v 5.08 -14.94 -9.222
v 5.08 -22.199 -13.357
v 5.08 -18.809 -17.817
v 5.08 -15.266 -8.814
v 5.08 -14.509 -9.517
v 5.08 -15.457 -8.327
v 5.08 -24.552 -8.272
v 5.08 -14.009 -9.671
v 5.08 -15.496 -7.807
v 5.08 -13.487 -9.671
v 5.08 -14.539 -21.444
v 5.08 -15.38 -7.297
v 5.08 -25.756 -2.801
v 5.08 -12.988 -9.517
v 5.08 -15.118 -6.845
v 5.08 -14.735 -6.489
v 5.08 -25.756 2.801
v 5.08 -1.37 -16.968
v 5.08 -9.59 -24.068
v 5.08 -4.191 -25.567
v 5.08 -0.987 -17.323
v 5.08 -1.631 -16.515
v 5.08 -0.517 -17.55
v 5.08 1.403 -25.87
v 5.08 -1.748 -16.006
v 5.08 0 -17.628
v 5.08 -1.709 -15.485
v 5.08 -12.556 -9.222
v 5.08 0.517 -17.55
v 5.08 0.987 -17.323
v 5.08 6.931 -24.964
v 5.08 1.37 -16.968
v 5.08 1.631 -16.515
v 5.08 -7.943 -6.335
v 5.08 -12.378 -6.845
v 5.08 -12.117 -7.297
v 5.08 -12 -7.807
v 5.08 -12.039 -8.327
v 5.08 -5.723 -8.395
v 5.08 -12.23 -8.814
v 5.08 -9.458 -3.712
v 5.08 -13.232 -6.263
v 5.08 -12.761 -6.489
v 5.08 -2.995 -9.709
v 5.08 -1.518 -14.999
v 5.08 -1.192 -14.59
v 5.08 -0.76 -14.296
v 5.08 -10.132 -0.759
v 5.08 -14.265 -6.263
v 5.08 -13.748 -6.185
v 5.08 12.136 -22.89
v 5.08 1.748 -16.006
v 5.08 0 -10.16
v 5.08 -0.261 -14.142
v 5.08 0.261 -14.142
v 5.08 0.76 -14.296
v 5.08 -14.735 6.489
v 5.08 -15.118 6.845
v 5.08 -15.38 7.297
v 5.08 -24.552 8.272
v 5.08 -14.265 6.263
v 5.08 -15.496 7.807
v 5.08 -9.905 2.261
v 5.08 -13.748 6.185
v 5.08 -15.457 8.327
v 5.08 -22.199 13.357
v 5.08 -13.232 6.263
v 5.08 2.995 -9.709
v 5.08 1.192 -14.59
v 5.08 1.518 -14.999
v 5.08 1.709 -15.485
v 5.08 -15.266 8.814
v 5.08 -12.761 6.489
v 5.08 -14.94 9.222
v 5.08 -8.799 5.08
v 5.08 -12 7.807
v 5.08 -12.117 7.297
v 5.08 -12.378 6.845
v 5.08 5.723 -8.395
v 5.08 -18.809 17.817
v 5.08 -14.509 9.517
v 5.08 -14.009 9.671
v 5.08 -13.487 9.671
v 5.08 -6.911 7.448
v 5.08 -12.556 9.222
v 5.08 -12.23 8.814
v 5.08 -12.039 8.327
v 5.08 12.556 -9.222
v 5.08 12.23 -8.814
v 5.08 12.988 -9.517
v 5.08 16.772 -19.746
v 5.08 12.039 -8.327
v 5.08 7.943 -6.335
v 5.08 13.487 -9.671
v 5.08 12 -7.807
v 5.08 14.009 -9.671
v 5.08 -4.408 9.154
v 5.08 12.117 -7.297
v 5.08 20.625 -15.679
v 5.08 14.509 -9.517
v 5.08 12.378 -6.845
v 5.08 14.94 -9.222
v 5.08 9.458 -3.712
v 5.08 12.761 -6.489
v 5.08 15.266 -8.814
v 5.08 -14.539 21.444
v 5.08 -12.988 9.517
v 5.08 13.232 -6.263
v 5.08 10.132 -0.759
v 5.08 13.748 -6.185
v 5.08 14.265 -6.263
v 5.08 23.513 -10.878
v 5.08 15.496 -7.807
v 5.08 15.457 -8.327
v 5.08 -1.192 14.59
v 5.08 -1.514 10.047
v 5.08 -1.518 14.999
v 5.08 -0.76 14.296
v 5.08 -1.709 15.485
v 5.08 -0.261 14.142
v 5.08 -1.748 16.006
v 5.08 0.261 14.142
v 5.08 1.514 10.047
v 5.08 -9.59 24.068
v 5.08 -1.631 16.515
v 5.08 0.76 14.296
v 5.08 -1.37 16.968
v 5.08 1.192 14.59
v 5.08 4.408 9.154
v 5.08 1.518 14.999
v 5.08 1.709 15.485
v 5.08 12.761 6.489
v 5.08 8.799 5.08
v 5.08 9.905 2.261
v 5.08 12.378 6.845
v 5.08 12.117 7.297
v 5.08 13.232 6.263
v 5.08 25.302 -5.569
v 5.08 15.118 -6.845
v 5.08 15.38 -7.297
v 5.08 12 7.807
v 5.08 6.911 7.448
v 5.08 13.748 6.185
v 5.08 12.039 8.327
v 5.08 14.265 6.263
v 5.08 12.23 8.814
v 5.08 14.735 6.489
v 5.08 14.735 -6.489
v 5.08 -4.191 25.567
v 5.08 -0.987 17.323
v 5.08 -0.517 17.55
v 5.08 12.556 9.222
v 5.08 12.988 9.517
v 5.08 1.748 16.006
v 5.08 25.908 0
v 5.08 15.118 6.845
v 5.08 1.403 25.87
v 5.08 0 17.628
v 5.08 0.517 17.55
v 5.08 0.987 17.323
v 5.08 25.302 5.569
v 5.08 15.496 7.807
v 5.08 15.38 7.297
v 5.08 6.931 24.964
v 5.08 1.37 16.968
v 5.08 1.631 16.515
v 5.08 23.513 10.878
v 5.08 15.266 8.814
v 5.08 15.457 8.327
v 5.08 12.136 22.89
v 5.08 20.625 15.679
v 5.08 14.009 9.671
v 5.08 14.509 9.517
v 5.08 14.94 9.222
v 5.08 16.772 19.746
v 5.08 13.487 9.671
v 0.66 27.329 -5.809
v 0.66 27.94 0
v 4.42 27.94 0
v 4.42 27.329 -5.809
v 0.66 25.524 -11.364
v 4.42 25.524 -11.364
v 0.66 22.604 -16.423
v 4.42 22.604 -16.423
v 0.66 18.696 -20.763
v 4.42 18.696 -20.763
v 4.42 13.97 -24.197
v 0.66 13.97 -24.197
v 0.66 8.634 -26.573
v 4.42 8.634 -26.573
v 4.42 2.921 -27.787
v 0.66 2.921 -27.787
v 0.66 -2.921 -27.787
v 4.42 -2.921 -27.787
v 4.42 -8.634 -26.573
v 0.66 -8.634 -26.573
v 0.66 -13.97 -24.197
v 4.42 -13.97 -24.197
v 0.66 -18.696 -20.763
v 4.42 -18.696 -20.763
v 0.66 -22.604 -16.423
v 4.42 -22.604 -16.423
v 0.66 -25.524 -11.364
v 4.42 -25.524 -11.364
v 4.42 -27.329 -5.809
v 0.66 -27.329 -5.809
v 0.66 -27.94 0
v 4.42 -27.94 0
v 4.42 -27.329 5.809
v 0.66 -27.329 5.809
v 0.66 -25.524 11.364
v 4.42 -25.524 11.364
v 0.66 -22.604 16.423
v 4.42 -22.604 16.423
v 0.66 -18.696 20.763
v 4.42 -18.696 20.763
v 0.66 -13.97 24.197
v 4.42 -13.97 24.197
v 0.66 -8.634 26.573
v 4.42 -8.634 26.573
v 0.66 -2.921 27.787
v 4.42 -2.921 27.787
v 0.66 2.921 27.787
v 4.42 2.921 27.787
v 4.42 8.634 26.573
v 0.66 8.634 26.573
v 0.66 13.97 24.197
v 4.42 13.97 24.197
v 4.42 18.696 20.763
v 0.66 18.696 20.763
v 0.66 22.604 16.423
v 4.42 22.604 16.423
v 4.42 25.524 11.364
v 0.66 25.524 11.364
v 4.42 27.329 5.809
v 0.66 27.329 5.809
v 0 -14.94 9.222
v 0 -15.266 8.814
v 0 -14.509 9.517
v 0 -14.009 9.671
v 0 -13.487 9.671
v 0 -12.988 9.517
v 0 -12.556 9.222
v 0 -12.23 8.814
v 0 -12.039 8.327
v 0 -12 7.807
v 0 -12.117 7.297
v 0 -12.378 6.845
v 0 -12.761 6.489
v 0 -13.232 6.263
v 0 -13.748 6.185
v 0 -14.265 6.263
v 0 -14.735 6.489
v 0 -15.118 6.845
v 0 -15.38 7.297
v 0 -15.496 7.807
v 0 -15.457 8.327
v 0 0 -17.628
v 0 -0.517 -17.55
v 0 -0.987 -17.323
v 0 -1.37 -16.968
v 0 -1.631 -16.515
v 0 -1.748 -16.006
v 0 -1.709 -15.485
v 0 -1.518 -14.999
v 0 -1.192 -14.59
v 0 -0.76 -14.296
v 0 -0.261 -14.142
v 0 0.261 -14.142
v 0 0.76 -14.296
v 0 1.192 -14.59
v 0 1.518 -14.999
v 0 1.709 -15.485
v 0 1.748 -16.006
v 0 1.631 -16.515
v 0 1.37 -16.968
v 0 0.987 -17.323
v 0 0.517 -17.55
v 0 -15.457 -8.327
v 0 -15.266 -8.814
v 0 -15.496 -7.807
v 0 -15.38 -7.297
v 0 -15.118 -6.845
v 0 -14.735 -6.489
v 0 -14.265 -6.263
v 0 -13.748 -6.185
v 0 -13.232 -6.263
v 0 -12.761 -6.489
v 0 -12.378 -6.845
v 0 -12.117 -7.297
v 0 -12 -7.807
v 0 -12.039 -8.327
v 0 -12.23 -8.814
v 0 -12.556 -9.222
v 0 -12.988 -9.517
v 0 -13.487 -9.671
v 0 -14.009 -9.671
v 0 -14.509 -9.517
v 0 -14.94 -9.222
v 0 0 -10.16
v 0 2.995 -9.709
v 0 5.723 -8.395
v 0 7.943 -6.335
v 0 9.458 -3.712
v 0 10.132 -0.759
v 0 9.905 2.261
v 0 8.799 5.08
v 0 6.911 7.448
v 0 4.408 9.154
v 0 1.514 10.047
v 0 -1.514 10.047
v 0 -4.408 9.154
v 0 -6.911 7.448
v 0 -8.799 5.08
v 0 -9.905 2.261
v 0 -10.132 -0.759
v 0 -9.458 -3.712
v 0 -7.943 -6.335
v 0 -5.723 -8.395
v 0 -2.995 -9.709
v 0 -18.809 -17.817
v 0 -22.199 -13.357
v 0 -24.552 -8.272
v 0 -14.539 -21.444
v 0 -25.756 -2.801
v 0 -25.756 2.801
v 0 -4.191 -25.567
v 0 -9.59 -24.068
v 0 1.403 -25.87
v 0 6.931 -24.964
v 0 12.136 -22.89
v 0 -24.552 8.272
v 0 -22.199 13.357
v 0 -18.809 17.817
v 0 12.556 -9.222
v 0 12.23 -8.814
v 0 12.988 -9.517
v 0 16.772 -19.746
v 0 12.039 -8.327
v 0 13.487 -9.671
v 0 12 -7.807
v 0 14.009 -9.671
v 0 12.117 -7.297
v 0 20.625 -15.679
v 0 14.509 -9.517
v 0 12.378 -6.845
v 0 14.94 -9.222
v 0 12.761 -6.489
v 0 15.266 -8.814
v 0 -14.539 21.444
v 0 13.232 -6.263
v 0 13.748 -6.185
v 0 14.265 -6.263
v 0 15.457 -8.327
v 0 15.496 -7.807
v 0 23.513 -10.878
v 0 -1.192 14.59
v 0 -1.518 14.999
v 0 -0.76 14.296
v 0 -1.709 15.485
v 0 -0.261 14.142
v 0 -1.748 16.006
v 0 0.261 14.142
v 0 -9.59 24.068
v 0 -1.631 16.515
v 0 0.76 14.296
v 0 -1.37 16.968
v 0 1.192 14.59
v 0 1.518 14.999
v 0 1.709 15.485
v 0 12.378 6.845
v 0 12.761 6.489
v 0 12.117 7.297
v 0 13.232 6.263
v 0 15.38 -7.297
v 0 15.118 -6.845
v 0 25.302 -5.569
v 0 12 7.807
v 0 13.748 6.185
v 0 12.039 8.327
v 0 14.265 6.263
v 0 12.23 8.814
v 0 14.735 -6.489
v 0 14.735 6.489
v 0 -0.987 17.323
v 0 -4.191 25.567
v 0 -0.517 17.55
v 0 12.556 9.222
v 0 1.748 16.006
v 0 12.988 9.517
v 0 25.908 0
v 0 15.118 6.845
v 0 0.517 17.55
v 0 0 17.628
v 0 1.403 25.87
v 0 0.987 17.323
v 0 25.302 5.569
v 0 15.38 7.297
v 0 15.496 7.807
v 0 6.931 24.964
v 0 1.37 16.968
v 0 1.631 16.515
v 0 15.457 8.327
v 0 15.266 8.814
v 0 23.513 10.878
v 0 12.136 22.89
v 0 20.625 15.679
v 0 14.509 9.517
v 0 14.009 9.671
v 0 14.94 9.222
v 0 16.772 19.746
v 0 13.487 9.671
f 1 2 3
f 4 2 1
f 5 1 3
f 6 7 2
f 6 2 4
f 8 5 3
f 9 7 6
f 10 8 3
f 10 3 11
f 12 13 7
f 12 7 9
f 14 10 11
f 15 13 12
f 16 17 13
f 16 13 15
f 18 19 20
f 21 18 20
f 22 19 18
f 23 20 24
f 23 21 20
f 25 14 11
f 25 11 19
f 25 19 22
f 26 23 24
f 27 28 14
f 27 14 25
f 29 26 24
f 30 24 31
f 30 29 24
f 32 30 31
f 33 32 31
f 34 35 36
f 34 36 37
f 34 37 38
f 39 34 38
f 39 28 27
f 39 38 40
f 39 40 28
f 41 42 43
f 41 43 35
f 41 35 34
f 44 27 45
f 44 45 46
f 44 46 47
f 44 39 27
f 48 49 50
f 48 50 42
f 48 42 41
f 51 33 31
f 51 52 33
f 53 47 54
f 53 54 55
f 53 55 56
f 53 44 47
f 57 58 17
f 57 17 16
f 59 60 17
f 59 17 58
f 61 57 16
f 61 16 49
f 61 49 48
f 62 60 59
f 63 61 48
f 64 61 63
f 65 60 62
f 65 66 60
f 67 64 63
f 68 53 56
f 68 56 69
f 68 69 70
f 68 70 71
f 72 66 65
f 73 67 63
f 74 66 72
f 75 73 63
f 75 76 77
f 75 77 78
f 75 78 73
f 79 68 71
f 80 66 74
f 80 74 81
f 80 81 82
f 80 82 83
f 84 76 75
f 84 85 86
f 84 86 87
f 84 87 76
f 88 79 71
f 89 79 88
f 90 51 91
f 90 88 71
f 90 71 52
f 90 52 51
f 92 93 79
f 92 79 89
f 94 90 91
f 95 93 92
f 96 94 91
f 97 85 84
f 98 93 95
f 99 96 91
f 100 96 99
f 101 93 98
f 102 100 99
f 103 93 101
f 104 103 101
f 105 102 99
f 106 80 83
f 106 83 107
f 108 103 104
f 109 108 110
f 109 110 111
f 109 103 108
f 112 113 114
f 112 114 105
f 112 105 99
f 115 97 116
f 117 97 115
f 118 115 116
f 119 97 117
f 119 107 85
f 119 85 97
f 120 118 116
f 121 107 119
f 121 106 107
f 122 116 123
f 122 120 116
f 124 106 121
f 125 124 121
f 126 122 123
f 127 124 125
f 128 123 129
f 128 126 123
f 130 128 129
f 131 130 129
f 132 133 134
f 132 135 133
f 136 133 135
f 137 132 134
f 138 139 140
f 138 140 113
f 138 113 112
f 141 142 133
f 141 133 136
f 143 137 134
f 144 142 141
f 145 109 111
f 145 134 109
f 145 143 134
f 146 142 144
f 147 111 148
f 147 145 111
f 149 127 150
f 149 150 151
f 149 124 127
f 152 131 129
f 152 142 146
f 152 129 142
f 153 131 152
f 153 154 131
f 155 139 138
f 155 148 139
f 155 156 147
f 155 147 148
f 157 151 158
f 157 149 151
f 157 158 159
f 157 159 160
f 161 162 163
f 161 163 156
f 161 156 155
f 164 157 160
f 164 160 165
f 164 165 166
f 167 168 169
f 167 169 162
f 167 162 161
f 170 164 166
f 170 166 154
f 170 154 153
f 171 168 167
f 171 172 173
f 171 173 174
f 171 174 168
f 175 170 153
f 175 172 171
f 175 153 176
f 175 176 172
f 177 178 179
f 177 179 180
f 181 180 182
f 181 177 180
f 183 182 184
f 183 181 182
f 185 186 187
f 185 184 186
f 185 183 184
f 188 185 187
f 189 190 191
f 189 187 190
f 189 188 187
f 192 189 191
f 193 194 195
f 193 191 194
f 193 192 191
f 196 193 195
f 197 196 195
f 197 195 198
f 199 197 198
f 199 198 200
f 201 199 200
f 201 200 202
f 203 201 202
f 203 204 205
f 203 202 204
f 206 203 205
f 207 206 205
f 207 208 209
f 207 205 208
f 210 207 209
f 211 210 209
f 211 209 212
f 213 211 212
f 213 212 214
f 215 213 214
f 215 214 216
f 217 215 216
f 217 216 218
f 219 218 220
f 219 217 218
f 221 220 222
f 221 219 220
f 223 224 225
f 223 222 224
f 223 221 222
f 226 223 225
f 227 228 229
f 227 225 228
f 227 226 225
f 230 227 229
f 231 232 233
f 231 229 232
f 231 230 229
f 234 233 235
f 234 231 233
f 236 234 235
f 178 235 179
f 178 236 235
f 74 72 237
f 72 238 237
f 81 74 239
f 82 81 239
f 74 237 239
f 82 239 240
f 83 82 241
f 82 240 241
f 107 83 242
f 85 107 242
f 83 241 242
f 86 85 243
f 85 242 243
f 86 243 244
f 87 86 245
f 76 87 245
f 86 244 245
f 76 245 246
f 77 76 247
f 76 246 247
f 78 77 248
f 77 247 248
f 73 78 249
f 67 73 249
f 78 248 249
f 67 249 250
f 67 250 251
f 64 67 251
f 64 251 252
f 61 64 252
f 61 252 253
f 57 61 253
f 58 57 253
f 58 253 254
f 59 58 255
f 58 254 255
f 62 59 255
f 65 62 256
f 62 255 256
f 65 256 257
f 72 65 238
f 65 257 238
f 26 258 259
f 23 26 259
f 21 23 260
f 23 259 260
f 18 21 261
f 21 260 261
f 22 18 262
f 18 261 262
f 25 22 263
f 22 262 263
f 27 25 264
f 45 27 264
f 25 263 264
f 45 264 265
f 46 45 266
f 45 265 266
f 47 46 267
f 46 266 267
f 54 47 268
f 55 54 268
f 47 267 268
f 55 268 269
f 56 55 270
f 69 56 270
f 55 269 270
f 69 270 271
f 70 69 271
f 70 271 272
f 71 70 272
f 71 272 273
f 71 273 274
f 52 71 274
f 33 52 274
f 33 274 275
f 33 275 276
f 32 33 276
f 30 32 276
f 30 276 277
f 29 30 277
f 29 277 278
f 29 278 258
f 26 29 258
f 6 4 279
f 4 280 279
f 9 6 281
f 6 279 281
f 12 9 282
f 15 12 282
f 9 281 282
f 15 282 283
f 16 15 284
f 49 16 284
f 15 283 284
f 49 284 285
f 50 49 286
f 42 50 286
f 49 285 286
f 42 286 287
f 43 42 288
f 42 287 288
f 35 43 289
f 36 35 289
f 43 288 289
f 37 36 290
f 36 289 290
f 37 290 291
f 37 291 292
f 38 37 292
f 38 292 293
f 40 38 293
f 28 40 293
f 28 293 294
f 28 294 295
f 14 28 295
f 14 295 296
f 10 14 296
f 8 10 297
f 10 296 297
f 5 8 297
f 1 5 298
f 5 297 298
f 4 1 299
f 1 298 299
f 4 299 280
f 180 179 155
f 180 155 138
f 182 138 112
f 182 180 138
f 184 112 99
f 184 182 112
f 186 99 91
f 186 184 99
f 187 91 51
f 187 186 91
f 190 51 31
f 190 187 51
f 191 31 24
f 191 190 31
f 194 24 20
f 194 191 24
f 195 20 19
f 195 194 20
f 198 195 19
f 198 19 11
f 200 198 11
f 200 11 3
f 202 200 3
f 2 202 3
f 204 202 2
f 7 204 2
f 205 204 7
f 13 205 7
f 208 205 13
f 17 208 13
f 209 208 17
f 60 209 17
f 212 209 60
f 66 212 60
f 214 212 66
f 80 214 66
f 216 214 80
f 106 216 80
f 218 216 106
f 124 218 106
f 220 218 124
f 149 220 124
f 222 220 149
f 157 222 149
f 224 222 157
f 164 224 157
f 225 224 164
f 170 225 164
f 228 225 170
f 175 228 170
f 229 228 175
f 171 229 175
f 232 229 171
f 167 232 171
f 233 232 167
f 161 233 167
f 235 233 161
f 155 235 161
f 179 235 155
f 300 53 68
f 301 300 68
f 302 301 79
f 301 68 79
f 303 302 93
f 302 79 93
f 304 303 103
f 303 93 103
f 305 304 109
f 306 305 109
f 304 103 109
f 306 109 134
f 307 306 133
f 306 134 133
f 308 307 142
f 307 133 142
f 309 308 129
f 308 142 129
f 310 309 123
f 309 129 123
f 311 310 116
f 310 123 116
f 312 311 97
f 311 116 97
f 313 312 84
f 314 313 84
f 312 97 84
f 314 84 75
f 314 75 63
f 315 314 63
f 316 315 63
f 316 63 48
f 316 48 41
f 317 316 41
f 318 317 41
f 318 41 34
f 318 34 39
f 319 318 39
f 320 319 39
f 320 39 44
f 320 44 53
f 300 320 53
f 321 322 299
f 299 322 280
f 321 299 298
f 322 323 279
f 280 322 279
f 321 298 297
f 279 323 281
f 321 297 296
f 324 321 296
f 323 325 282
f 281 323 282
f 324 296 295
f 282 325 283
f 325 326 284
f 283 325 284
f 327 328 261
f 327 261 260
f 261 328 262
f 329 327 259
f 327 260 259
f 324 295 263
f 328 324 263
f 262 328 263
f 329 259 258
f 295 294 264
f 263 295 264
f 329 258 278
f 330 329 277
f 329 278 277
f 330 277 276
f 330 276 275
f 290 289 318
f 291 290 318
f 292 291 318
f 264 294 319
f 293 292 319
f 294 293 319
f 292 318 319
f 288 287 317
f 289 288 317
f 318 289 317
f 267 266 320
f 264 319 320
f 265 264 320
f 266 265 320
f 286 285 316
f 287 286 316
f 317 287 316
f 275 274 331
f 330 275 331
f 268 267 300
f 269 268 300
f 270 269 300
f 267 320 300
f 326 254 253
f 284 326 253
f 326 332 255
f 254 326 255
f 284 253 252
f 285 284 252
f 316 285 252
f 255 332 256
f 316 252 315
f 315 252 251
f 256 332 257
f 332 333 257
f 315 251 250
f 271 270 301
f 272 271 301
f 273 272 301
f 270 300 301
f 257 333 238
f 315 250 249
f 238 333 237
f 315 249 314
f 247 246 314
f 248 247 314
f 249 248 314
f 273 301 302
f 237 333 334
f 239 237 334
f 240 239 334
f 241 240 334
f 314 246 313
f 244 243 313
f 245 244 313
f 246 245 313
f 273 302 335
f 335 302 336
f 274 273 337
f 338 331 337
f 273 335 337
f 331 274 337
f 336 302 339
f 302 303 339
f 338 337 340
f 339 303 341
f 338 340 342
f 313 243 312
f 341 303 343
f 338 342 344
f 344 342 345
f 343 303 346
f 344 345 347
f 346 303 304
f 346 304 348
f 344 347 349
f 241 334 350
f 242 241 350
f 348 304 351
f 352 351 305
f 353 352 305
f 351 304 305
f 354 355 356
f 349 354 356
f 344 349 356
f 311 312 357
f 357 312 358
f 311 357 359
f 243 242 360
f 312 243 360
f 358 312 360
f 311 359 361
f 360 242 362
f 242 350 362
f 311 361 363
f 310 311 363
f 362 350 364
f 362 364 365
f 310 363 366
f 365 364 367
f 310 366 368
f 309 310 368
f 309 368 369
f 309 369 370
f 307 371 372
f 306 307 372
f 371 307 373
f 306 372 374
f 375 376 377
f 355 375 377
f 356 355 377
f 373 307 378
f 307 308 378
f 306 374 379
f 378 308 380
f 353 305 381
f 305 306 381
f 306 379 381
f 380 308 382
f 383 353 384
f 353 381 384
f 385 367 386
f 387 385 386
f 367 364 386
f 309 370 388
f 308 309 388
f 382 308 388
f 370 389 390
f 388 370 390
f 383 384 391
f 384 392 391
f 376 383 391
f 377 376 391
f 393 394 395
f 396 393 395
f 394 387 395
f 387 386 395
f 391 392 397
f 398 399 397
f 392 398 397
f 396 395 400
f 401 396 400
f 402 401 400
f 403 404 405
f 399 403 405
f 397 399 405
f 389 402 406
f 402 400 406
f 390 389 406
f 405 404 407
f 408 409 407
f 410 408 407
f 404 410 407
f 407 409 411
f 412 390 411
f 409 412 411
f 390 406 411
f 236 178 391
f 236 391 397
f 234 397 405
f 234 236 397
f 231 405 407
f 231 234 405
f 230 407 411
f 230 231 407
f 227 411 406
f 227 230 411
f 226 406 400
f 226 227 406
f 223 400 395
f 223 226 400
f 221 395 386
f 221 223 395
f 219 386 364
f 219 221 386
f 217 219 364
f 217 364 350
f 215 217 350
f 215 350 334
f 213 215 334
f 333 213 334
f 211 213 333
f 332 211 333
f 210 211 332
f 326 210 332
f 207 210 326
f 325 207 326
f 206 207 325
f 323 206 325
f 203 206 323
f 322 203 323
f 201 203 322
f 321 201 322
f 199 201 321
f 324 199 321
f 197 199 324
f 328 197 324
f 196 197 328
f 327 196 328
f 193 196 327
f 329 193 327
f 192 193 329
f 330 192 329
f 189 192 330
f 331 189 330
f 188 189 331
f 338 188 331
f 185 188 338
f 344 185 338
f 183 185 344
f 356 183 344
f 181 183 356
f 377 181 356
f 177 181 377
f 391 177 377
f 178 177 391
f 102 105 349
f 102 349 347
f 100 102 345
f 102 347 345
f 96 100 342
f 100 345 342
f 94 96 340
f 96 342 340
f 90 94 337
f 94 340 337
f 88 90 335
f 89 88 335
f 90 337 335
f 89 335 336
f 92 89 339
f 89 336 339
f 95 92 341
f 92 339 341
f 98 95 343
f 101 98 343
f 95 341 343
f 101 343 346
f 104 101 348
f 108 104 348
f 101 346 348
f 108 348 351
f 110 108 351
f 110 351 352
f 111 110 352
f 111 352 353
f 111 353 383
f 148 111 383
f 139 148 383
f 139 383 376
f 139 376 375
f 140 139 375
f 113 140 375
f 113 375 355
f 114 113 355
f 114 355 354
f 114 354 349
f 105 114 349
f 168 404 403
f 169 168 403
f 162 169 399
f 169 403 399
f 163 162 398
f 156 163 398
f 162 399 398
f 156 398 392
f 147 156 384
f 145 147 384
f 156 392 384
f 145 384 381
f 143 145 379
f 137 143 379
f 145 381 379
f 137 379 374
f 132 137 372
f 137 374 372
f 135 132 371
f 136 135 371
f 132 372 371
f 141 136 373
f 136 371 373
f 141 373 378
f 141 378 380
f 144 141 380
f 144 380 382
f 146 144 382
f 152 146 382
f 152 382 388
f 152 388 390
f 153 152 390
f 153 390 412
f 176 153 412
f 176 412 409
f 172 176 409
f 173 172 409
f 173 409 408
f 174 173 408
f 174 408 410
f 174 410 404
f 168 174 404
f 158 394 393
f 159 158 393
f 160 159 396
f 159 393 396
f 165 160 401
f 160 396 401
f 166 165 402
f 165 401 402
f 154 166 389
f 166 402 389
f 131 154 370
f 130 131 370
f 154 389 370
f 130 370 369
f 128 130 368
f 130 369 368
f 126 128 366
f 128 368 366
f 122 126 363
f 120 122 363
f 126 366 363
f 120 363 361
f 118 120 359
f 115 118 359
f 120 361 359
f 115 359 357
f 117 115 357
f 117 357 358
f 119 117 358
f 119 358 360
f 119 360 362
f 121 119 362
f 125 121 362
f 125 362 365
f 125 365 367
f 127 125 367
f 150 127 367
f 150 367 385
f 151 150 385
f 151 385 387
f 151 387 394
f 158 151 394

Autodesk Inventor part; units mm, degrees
ref_plane "YZ Plane" through (0, 0, 0) normal (1, 0, 0) x (0, 1, 0)
ref_plane "XZ Plane" through (0, 0, 0) normal (0, 1, 0) x (-1, 0, 0)
ref_plane "XY Plane" through (0, 0, 0) normal (0, 0, 1) x (1, 0, 0)
sketch "Sketch1" plane through (0, 0, 0) normal (1, 0, 0) x (0, 1, 0)
  circle A0 centre (0, 0) radius 27.94
  dimension "d0" = 55.88
extrude "Extrusion1" add sketch "Sketch1" along normal blind 5.08
sketch "Sketch3" plane through (5.08, 0, 0) normal (1, 0, 0) x (0, 0, -1)
  point P0 (0, 0)
  point P1 (15.875, 0)
  dimension "d6" = 15.875
hole "Hole1" at (5.08, 0, -15.875) direction (-1, 0, 0) diameter 3.5052 end through all
pattern_circular "Circular Pattern1" count 6 over 360 about axis through (-10, 0, 0) along (1, 0, 0) of "Hole1"
chamfer "Chamfer1" distance 2.032 angle 18 1 edges at (0, -27.94, 0) measured on face at (0, 4.0768, 2.3537)
sketch "Sketch4" plane through (5.08, 0, 0) normal (1, 0, 0) x (0, 0, -1)
  circle A0 centre (0, 0) radius 10.16
  dimension "d20" = 20.32
extrude "Extrusion3" cut sketch "Sketch4" against normal through all
chamfer "Chamfer2" distance 2.032 angle 18 1 edges at (5.08, -27.94, 0) measured on face at (5.08, -19.1807, 0)
properties part number "CHA_005_DrivePulleyCenterFlange" material "ABS Plastic"
